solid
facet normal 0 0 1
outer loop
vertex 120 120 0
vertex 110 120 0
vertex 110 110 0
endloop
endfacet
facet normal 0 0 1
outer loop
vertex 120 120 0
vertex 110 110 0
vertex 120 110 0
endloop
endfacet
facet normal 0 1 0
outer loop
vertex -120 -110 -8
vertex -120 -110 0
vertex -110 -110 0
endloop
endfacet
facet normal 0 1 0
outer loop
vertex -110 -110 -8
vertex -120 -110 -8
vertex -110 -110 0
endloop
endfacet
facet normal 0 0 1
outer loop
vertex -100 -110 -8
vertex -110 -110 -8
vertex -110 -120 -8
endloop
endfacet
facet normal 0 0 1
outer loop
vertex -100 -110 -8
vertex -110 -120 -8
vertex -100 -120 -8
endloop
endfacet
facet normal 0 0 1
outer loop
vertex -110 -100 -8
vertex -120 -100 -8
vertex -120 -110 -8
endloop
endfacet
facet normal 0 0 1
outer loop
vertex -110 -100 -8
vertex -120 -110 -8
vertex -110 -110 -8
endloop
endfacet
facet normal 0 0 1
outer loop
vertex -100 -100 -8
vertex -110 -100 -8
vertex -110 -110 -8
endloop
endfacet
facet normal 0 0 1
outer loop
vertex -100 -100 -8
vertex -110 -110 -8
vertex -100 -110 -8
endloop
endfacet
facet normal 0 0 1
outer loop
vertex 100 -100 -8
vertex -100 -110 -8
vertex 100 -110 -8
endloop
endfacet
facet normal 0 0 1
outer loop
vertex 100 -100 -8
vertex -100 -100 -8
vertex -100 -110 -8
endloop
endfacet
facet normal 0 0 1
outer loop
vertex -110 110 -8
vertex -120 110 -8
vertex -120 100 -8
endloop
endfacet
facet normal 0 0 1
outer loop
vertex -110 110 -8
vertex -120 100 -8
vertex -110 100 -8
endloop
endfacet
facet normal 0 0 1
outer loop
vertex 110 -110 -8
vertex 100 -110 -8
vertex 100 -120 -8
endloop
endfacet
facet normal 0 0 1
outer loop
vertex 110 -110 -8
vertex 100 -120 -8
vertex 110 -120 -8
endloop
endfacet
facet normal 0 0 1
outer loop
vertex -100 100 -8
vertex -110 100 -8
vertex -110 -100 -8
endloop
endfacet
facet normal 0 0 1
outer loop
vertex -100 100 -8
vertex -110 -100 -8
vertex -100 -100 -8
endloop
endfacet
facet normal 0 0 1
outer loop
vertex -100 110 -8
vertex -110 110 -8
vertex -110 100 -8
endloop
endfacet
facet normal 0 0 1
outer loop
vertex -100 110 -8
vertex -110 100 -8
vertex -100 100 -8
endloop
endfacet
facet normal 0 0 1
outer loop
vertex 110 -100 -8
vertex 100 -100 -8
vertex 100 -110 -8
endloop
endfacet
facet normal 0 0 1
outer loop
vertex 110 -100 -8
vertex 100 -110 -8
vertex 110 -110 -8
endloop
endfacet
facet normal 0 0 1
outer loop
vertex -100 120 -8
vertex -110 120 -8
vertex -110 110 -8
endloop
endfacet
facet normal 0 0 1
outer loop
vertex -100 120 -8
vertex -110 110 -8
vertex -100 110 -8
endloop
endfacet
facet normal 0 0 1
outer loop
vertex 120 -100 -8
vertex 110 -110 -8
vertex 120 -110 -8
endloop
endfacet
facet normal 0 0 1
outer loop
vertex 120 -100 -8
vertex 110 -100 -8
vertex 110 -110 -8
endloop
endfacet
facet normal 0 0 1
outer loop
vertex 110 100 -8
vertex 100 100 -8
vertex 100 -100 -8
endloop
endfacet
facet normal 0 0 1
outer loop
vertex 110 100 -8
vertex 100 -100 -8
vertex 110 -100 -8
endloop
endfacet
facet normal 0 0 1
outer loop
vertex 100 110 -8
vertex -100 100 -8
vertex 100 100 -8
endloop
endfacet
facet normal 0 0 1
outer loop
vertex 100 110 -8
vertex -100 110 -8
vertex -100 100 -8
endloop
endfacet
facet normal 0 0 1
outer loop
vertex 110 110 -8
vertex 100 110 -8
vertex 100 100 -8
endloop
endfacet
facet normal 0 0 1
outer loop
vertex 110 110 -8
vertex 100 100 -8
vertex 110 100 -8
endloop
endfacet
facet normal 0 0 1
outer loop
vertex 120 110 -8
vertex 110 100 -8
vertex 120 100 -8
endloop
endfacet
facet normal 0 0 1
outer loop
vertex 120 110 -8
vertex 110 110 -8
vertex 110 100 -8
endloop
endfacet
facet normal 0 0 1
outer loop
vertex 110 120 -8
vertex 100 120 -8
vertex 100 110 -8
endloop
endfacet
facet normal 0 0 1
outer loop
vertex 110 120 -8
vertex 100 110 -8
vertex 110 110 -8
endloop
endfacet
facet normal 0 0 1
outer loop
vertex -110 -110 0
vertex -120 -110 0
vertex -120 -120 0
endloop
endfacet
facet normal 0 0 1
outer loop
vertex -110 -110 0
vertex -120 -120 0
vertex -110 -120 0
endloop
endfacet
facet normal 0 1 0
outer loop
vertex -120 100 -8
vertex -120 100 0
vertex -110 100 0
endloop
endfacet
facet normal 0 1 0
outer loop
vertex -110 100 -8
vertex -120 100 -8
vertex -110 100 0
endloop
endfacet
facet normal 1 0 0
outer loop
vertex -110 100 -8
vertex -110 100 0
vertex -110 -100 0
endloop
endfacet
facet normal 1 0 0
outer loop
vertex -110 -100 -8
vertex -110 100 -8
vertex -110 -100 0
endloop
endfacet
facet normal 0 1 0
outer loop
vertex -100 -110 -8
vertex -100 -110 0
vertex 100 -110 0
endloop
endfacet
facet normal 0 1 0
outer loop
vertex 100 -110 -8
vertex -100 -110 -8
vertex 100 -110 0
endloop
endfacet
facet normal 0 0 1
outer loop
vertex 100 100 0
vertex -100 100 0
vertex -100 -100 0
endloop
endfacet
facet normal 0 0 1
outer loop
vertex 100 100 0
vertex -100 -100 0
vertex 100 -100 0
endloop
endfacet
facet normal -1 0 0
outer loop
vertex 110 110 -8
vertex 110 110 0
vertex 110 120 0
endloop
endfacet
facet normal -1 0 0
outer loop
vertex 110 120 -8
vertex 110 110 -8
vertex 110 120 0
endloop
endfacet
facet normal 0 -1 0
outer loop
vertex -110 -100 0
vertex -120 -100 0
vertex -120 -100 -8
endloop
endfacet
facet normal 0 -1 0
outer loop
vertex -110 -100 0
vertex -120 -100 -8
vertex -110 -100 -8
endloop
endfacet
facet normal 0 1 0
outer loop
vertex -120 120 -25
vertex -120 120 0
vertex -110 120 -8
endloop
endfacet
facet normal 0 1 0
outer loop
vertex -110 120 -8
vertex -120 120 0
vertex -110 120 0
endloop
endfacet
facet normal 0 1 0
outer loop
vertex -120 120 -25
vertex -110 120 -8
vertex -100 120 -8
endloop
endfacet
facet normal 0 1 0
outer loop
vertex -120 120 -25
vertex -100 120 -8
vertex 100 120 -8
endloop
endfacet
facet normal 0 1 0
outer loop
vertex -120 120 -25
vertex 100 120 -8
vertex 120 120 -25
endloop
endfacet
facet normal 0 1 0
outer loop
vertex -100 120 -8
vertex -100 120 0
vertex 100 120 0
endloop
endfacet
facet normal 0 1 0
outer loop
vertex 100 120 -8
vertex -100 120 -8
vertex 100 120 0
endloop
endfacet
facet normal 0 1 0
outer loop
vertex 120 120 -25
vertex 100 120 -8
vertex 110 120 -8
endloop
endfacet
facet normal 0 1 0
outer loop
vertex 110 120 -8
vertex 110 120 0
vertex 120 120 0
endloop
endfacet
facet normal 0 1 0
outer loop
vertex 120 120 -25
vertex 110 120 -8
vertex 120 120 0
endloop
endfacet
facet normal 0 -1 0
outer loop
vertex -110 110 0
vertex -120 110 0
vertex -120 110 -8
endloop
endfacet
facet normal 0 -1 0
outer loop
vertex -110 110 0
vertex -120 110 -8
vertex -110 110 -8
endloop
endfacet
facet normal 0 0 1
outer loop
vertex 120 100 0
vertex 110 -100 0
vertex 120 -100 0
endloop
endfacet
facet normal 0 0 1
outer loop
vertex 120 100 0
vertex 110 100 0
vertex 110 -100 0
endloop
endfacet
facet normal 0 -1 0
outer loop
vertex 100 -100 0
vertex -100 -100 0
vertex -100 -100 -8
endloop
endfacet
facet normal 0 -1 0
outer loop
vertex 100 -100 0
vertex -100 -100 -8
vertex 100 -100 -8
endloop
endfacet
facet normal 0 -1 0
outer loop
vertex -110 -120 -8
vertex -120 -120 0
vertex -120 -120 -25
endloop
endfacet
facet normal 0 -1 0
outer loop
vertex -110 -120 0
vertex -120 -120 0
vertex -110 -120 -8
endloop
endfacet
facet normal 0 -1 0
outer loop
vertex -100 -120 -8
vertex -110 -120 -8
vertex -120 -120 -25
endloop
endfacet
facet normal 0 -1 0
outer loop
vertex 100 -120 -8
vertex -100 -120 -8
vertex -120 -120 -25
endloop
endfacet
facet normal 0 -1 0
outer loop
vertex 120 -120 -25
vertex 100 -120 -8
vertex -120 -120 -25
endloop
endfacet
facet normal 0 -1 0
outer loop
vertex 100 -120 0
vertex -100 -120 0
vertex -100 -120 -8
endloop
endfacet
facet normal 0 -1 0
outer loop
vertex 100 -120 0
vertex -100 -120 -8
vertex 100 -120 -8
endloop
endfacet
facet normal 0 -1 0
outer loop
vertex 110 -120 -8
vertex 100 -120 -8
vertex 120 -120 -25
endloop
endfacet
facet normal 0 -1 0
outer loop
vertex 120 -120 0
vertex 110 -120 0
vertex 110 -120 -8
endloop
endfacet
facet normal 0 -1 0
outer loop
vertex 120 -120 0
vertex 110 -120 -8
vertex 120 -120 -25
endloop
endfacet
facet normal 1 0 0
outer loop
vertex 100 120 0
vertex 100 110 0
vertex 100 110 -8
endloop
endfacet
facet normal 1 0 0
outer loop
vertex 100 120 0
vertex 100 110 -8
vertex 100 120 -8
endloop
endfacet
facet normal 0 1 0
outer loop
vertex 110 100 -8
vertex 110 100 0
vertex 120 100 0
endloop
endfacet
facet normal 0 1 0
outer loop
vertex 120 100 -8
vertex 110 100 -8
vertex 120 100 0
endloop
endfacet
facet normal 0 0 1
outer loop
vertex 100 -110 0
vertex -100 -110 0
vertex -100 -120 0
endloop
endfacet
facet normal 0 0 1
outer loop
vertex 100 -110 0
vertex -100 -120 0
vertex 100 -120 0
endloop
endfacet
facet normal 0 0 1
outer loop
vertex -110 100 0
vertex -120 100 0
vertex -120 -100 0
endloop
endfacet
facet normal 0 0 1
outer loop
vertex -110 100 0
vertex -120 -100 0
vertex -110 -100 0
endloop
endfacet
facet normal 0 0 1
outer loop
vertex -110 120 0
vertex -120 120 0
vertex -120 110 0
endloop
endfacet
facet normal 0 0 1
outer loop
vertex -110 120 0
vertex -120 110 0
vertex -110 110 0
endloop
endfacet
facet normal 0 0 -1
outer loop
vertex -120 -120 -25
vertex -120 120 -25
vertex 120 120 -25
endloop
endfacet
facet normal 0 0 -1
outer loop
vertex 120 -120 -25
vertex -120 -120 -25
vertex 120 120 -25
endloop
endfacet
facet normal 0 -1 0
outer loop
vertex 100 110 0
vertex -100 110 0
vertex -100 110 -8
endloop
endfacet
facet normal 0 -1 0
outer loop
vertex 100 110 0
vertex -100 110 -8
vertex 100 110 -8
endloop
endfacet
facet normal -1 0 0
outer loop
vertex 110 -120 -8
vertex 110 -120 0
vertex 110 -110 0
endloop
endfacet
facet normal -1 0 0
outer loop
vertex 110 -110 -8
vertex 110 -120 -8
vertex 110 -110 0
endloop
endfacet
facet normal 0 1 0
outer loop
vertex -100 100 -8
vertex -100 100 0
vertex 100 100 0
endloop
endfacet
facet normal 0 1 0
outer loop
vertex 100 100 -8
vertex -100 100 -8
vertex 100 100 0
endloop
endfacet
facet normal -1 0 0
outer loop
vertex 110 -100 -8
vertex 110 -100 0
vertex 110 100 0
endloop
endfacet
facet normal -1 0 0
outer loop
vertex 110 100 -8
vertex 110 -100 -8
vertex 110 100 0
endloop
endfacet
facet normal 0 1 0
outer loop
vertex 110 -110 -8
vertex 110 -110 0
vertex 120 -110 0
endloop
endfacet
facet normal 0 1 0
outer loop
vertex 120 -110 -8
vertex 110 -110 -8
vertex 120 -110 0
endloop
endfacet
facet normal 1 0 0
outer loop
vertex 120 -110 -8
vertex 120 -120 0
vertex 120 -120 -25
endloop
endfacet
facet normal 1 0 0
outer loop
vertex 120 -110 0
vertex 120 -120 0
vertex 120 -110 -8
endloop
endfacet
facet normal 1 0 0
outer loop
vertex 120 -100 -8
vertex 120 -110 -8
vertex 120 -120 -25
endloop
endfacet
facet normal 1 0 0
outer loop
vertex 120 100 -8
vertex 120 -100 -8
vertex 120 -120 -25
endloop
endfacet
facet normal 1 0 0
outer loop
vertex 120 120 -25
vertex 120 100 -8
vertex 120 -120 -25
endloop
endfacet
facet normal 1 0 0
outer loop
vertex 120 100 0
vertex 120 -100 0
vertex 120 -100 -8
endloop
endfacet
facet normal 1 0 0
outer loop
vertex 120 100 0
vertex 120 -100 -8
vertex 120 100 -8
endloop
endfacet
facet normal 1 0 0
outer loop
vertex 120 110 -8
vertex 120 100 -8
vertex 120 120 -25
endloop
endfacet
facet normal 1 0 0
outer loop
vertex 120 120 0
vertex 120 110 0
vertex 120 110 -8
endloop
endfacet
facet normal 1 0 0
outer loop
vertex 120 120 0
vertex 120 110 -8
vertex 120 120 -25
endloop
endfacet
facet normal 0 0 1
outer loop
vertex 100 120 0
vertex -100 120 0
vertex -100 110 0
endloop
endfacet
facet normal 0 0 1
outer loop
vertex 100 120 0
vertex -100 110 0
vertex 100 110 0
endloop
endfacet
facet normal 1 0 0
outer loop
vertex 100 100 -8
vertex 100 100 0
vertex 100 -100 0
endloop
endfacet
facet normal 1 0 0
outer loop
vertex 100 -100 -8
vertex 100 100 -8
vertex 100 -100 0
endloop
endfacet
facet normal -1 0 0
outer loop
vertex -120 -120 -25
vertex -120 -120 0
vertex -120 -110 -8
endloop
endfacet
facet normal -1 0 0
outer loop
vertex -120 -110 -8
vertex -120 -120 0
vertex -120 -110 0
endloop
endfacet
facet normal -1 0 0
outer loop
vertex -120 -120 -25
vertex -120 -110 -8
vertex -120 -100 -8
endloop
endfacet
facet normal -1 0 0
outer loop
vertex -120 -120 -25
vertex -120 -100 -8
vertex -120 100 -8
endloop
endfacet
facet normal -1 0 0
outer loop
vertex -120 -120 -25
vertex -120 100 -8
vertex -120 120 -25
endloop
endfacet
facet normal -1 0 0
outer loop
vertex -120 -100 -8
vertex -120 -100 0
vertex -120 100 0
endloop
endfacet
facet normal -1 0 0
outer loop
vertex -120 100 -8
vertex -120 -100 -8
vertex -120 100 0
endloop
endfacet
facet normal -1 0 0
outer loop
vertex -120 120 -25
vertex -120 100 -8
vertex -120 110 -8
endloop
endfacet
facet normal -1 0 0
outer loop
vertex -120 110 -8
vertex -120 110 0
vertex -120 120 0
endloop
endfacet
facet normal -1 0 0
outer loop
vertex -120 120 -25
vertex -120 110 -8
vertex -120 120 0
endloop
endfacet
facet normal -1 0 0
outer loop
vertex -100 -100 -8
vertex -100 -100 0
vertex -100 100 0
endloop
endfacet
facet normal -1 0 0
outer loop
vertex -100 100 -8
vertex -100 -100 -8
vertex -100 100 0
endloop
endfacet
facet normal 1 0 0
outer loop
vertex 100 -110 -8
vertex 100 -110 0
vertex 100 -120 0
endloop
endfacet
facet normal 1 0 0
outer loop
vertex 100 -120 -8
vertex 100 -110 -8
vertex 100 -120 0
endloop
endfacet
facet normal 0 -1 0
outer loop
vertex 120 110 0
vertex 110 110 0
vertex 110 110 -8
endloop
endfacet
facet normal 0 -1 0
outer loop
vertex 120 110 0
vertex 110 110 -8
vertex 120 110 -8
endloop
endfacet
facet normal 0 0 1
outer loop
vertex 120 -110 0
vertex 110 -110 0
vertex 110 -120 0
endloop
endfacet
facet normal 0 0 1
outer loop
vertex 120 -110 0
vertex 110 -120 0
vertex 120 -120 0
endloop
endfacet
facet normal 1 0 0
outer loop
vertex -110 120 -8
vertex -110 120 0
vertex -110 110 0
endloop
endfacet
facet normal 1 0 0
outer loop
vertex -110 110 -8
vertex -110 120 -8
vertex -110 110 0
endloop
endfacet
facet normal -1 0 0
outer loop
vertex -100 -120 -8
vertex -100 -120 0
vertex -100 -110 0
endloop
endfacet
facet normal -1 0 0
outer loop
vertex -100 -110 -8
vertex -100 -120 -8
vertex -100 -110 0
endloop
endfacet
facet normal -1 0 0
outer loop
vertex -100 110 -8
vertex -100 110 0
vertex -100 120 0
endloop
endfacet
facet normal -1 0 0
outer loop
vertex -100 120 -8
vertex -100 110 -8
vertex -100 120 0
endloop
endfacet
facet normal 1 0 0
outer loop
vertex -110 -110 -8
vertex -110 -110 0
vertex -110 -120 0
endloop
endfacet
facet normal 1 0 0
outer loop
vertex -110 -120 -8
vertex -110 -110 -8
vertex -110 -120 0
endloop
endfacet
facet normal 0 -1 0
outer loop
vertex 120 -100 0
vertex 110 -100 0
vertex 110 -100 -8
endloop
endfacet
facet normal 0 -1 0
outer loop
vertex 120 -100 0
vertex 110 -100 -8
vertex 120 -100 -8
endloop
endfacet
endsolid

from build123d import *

# Parameters (mm, degrees)
F0_W     = 240
F0_H     = 240
F1_DEPTH = 25
F2_W     = 10
F2_H     = 10
F2_H_2   = 200
F2_W_2   = 200
F3_DEPTH = 8


with BuildPart() as f1:
    # F0 (on Top) → F1 (new body)
    with BuildSketch(Plane.XY):
        Rectangle(F0_W, F0_H)
    extrude(amount=-F1_DEPTH)

    # F2 (on face) → F3 (cut)
    with BuildSketch(Plane.XY):
        with Locations((-105, 115)):
            Rectangle(F2_W, F2_H)
        with Locations((-105, 105)):
            Rectangle(F2_W, F2_H)
        with Locations((-115, 105)):
            Rectangle(F2_W, F2_H)
        with Locations((-105, 0)):
            Rectangle(F2_W, F2_H_2)
        with Locations((0, 105)):
            Rectangle(F2_W_2, F2_H)
        with Locations((105, 115)):
            Rectangle(F2_W, F2_H)
        with Locations((115, 105)):
            Rectangle(F2_W, F2_H)
        with Locations((105, 105)):
            Rectangle(F2_W, F2_H)
        with Locations((105, 0)):
            Rectangle(F2_W, F2_H_2)
        with Locations((105, -115)):
            Rectangle(F2_W, F2_H)
        with Locations((105, -105)):
            Rectangle(F2_W, F2_H)
        with Locations((115, -105)):
            Rectangle(F2_W, F2_H)
        with Locations((0, -105)):
            Rectangle(F2_W_2, F2_H)
        with Locations((-105, -105)):
            Rectangle(F2_W, F2_H)
        with Locations((-105, -115)):
            Rectangle(F2_W, F2_H)
        with Locations((-115, -105)):
            Rectangle(F2_W, F2_H)
    extrude(amount=-F3_DEPTH, mode=Mode.SUBTRACT)


solid = f1.part
